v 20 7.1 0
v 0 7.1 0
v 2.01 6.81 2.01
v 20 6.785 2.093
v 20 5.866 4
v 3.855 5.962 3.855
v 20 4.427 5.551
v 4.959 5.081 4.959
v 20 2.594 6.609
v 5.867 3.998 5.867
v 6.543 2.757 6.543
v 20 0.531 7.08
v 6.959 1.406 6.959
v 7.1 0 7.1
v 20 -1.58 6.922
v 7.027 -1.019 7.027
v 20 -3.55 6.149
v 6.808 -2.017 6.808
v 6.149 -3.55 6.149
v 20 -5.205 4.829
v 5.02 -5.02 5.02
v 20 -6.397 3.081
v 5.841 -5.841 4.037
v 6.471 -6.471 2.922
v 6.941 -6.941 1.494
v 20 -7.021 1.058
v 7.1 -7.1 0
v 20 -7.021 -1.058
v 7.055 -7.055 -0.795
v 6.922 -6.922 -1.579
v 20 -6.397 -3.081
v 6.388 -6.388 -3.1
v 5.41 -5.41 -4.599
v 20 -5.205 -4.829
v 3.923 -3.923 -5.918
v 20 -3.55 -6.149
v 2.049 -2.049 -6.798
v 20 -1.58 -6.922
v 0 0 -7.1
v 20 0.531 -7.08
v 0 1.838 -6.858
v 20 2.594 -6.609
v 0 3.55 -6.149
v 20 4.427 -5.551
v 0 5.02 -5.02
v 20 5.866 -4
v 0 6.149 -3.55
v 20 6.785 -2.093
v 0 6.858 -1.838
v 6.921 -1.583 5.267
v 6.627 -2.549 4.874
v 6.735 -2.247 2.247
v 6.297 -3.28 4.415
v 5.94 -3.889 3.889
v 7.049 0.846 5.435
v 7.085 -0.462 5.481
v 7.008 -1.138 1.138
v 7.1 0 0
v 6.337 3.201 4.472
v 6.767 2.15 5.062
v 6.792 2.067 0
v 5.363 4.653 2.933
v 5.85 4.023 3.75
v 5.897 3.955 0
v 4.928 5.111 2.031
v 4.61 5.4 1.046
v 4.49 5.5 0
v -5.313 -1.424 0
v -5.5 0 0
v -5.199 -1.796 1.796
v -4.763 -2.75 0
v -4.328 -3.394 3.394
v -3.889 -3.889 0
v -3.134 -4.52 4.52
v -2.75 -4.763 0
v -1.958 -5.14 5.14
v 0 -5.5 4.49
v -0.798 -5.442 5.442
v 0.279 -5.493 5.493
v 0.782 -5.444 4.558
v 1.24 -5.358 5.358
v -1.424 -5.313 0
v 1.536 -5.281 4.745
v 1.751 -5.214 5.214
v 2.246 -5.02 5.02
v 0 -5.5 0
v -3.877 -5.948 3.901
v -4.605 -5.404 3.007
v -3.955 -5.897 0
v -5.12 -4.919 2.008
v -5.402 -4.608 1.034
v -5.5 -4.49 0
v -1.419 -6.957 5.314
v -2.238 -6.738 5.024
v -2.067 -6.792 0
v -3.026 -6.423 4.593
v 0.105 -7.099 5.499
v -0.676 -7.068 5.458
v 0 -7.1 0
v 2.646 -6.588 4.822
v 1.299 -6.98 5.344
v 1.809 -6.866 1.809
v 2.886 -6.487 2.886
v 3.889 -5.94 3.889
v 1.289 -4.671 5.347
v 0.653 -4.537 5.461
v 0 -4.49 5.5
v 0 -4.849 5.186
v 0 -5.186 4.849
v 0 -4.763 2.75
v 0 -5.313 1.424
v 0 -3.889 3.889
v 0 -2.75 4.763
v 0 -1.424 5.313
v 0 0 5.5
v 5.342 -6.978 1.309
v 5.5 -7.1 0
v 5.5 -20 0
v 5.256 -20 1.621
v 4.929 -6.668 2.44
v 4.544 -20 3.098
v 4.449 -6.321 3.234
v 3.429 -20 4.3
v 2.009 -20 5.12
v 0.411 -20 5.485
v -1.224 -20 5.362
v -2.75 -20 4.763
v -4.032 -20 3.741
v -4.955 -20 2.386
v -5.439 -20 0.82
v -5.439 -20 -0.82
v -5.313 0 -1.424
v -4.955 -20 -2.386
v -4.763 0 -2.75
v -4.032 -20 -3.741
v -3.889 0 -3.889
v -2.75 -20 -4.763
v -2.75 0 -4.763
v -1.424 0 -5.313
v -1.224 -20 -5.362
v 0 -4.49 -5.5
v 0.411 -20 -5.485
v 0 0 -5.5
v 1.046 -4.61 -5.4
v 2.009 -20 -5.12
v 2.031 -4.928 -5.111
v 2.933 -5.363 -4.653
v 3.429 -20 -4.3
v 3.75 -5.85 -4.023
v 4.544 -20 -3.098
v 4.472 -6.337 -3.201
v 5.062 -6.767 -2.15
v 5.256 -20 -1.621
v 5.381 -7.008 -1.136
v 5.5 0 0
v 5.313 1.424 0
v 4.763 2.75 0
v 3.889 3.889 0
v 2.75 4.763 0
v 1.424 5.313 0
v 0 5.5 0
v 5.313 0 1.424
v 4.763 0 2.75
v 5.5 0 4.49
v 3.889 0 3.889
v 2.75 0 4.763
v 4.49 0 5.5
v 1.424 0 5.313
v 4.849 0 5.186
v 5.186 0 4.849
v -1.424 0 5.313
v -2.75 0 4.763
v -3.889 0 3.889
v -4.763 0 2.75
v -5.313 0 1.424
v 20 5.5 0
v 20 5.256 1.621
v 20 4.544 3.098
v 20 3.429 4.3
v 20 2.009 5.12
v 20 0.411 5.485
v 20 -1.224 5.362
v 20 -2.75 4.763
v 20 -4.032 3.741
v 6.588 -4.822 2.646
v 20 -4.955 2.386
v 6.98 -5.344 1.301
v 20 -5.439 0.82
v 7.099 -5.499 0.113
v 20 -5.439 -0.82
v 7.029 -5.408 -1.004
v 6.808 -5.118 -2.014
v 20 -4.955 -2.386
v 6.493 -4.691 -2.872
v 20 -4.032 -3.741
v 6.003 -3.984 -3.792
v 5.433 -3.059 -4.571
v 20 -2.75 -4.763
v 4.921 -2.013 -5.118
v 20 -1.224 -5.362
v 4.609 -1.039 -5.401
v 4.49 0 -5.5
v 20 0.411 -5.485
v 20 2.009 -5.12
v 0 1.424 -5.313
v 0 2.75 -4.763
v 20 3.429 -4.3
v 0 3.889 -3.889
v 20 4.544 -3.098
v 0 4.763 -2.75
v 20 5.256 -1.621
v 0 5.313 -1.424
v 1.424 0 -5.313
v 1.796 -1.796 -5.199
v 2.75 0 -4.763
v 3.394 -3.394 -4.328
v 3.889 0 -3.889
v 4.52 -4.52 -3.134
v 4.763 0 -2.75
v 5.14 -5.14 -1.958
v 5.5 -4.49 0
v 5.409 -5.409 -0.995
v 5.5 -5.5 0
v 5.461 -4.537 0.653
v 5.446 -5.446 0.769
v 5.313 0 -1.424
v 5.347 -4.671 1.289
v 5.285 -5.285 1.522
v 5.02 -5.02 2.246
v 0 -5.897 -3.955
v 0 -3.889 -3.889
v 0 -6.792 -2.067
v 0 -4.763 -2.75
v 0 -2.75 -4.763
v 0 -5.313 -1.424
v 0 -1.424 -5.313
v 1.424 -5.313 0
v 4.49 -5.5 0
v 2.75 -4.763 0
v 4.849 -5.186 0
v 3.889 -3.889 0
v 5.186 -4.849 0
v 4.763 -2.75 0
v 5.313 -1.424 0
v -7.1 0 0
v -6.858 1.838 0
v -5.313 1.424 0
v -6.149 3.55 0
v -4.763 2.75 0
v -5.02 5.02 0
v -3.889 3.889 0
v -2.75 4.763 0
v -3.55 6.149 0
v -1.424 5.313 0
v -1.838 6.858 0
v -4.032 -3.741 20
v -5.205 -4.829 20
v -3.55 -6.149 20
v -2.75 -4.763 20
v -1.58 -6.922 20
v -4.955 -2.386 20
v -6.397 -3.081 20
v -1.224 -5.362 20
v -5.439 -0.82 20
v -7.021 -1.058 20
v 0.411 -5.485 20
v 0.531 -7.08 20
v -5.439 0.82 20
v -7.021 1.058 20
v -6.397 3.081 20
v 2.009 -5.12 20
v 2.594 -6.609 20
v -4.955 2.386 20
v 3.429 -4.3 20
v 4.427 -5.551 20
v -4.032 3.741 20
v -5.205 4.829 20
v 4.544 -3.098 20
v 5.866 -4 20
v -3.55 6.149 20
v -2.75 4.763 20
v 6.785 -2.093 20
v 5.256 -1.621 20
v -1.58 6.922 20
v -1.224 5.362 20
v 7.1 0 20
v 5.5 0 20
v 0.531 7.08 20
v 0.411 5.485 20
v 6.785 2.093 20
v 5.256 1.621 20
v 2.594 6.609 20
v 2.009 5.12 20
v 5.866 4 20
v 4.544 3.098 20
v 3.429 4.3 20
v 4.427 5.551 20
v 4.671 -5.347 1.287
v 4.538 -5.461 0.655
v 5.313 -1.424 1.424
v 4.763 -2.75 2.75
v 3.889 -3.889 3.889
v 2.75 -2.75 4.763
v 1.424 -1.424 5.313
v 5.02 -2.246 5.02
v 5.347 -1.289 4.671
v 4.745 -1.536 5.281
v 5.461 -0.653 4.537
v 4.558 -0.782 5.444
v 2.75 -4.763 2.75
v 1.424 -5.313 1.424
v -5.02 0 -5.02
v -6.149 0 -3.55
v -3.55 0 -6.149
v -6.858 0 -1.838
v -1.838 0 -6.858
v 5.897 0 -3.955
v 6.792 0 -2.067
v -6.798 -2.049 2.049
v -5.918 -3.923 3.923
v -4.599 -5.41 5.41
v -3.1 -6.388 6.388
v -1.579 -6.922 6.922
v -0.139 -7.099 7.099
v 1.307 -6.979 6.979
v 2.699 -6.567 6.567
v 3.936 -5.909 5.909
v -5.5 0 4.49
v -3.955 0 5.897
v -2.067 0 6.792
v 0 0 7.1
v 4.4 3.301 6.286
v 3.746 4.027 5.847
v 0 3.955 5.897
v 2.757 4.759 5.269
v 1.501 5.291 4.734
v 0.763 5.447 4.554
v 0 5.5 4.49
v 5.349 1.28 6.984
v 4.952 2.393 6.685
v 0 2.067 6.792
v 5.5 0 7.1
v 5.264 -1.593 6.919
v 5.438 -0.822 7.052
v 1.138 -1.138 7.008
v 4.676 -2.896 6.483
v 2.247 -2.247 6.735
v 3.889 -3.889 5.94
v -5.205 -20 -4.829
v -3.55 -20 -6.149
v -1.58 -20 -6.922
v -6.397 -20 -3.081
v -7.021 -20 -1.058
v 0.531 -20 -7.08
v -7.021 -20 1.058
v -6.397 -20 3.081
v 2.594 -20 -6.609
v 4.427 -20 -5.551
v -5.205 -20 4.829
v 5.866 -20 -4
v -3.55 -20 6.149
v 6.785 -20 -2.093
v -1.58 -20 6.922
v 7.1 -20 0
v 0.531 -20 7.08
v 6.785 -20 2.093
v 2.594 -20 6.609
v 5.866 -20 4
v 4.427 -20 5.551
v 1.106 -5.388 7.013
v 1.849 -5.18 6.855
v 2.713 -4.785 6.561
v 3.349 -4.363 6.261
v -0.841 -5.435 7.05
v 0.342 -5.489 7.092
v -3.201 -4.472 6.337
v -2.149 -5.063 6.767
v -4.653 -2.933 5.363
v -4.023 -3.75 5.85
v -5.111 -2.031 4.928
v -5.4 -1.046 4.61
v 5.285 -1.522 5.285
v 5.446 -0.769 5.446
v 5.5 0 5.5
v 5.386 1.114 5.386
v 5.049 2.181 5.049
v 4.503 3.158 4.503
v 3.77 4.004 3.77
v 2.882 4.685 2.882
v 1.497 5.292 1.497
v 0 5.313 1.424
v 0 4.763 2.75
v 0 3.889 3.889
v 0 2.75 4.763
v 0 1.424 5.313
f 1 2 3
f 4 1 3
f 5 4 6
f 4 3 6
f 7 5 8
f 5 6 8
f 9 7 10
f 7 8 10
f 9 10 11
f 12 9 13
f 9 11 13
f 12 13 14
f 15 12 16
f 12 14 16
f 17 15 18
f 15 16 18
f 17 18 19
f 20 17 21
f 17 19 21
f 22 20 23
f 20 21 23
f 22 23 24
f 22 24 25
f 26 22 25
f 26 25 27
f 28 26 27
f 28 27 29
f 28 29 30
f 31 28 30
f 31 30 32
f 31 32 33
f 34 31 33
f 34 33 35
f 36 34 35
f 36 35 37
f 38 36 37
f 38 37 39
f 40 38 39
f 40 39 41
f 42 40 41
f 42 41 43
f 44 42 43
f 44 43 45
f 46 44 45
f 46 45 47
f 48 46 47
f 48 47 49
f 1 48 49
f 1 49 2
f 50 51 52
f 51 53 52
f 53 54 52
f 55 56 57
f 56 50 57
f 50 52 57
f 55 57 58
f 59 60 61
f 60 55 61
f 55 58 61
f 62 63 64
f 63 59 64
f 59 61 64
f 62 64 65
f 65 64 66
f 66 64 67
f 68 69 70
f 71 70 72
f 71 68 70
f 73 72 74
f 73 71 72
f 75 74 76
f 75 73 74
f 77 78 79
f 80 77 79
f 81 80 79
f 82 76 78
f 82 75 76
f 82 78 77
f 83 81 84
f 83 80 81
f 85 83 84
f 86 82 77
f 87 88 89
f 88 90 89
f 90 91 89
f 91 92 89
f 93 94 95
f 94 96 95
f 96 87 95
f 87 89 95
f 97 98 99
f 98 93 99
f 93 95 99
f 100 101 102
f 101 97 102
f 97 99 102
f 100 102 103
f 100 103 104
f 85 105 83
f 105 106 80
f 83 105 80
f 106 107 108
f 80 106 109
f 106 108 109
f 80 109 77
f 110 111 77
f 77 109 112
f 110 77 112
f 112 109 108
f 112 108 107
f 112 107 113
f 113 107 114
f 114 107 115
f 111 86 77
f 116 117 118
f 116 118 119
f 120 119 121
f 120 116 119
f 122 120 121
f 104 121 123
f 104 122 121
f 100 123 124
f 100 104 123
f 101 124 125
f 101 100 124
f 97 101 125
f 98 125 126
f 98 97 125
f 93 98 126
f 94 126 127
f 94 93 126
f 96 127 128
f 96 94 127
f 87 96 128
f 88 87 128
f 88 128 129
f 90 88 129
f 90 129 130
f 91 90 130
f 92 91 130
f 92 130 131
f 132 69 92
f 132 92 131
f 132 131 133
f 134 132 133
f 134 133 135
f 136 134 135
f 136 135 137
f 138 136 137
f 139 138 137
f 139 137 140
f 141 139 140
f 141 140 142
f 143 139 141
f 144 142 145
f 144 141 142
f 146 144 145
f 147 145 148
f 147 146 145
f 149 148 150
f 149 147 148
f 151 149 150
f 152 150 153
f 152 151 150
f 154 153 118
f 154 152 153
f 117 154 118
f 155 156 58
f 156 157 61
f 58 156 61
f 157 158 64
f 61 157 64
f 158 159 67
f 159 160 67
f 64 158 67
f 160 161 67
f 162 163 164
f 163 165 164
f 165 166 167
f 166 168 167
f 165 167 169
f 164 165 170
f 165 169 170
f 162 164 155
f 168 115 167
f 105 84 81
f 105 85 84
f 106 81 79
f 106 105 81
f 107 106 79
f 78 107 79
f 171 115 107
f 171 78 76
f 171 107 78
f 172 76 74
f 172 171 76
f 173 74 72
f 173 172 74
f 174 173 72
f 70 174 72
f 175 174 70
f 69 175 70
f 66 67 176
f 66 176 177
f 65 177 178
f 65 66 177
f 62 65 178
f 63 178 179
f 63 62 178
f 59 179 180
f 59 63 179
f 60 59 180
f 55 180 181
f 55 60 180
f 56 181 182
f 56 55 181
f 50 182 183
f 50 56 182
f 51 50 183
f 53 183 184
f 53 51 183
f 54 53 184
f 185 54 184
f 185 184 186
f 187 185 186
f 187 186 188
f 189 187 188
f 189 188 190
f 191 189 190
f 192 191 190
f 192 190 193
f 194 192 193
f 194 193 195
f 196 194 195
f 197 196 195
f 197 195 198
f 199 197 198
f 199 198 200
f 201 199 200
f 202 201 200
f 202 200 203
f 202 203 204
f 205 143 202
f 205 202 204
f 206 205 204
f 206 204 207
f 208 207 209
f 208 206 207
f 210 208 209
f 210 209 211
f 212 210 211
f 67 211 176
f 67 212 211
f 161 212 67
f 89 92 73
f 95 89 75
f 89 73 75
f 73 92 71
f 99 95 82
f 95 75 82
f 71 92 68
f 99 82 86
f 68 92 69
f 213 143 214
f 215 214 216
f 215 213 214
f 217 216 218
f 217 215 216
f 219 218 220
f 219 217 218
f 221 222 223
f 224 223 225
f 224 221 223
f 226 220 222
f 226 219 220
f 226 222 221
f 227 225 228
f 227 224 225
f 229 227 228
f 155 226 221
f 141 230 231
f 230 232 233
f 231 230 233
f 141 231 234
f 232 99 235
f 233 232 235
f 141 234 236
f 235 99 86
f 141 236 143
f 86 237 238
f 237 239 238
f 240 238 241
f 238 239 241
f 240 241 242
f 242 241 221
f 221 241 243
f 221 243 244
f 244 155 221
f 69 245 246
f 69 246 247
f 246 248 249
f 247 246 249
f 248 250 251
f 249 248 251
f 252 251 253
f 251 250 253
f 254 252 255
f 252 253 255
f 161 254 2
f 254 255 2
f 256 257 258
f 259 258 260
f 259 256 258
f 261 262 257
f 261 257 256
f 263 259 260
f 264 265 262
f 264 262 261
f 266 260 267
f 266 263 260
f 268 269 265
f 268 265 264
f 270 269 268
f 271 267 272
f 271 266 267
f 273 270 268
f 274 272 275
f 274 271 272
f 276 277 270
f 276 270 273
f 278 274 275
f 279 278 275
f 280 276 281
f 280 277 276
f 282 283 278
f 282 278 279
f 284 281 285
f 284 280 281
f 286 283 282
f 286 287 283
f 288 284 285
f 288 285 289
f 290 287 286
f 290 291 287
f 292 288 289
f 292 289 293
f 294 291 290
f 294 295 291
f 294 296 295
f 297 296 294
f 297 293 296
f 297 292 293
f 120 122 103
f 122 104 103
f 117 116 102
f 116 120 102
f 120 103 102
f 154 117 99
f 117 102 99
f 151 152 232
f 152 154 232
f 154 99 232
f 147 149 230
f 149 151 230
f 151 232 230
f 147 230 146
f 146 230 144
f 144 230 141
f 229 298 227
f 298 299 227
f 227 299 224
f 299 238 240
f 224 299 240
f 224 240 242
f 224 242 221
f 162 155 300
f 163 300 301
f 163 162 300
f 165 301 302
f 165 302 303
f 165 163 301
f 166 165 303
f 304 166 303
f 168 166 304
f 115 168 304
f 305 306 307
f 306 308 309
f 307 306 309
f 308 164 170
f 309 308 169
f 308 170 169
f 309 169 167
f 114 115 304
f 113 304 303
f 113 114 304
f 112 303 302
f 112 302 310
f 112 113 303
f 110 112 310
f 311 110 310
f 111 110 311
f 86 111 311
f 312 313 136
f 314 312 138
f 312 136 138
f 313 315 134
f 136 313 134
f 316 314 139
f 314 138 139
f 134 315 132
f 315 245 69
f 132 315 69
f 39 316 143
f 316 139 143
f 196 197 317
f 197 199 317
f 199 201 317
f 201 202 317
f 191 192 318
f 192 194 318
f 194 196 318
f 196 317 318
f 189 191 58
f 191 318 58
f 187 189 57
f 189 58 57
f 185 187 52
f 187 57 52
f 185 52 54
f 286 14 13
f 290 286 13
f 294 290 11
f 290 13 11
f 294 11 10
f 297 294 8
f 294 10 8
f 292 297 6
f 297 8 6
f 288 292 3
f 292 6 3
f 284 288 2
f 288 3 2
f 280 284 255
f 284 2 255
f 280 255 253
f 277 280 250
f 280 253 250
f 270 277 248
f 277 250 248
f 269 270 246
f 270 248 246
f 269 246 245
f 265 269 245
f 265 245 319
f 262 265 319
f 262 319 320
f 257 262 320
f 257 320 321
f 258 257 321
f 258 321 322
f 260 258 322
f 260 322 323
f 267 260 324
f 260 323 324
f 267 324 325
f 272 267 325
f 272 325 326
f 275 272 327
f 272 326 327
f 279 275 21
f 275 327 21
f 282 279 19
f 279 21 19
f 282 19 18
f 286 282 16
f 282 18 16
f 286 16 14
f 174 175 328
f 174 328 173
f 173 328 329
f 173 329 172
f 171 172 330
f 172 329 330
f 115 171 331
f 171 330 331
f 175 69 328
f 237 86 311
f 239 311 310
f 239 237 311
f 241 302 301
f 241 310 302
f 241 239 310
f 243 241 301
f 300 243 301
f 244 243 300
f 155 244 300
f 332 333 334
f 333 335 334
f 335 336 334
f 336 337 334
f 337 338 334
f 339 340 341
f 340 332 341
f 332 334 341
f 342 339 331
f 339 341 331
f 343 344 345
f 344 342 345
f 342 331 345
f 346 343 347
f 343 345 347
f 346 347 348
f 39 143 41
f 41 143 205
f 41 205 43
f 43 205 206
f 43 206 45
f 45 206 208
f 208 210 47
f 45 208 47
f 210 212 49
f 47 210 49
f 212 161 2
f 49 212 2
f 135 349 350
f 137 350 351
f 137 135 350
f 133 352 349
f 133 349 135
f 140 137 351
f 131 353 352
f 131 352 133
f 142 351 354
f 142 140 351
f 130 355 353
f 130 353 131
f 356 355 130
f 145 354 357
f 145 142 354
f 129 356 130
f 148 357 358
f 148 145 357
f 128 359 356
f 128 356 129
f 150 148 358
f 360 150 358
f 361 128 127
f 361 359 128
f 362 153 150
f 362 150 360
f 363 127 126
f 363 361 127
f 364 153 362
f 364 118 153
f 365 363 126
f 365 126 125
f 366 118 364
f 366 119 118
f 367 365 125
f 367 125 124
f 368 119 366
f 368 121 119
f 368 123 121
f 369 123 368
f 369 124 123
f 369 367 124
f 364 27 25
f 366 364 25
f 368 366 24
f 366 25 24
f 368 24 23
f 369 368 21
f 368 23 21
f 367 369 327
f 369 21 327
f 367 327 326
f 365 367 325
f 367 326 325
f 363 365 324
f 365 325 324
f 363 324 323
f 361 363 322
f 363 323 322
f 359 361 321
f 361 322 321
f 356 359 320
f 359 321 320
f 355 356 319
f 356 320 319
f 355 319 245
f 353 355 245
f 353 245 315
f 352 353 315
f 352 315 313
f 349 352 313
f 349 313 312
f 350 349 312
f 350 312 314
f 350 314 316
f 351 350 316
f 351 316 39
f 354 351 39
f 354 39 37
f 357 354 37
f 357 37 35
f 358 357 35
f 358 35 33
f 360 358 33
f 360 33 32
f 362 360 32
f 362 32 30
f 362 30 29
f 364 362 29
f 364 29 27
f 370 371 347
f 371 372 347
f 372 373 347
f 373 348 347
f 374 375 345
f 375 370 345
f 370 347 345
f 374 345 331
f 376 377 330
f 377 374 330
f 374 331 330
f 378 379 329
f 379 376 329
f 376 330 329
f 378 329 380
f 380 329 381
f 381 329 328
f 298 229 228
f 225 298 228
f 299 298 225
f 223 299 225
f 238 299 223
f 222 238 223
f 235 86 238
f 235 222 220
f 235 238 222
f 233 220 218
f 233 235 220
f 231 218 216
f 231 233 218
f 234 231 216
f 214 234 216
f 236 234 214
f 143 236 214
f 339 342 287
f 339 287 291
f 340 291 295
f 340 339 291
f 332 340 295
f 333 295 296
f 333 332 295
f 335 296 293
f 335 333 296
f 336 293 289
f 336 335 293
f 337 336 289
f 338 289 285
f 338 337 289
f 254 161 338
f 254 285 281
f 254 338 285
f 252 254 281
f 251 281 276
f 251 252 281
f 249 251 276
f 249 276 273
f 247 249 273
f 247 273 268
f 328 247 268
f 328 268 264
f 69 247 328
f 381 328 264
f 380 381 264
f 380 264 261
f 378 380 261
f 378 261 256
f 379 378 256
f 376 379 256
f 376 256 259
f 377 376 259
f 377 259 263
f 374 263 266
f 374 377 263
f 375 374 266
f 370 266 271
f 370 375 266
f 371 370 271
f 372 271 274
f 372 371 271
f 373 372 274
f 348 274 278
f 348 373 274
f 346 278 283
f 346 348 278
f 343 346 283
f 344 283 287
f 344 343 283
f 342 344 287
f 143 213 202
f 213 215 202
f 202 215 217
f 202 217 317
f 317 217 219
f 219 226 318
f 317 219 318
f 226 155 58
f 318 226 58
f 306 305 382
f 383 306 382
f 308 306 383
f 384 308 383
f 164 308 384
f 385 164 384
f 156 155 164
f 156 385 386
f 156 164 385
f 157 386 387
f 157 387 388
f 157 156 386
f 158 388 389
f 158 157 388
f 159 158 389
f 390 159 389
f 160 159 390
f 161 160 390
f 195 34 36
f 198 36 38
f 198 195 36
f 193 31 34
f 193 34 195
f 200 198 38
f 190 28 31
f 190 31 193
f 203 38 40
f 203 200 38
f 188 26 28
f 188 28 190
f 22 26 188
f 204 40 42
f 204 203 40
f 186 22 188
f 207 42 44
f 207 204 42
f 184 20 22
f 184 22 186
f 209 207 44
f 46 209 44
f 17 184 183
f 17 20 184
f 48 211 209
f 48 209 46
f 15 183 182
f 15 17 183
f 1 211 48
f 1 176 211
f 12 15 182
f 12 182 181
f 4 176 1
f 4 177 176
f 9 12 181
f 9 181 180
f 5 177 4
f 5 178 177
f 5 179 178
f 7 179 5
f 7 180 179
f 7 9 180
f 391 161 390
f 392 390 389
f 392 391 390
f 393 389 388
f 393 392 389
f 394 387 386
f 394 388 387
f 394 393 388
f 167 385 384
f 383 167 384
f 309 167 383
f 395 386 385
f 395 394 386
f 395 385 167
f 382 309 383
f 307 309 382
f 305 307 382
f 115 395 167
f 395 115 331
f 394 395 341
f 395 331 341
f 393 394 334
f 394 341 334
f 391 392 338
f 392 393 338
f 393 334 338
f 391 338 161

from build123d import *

# Parameters (mm, degrees)
F2_R     = 7.1
F2_R_2   = 5.5
F3_DEPTH = 20
F1_R     = 7.1
F1_R_2   = 5.5
F4_DEPTH = 20
F0_R     = 7.1
F0_R_2   = 5.5
F5_DEPTH = 20


with BuildPart() as f3:
    # F2 (on Right) → F3 (new body)
    with BuildSketch(Plane.YZ):
        Circle(F2_R)
        Circle(F2_R_2, mode=Mode.SUBTRACT)
    extrude(amount=F3_DEPTH)

    # F1 (on Front) → F4 (join)
    with BuildSketch(Plane.XZ):
        Circle(F1_R)
        Circle(F1_R_2, mode=Mode.SUBTRACT)
    extrude(amount=F4_DEPTH)

    # F0 (on Top) → F5 (join)
    with BuildSketch(Plane.XY):
        Circle(F0_R)
        Circle(F0_R_2, mode=Mode.SUBTRACT)
    extrude(amount=F5_DEPTH)


solid = f3.part
